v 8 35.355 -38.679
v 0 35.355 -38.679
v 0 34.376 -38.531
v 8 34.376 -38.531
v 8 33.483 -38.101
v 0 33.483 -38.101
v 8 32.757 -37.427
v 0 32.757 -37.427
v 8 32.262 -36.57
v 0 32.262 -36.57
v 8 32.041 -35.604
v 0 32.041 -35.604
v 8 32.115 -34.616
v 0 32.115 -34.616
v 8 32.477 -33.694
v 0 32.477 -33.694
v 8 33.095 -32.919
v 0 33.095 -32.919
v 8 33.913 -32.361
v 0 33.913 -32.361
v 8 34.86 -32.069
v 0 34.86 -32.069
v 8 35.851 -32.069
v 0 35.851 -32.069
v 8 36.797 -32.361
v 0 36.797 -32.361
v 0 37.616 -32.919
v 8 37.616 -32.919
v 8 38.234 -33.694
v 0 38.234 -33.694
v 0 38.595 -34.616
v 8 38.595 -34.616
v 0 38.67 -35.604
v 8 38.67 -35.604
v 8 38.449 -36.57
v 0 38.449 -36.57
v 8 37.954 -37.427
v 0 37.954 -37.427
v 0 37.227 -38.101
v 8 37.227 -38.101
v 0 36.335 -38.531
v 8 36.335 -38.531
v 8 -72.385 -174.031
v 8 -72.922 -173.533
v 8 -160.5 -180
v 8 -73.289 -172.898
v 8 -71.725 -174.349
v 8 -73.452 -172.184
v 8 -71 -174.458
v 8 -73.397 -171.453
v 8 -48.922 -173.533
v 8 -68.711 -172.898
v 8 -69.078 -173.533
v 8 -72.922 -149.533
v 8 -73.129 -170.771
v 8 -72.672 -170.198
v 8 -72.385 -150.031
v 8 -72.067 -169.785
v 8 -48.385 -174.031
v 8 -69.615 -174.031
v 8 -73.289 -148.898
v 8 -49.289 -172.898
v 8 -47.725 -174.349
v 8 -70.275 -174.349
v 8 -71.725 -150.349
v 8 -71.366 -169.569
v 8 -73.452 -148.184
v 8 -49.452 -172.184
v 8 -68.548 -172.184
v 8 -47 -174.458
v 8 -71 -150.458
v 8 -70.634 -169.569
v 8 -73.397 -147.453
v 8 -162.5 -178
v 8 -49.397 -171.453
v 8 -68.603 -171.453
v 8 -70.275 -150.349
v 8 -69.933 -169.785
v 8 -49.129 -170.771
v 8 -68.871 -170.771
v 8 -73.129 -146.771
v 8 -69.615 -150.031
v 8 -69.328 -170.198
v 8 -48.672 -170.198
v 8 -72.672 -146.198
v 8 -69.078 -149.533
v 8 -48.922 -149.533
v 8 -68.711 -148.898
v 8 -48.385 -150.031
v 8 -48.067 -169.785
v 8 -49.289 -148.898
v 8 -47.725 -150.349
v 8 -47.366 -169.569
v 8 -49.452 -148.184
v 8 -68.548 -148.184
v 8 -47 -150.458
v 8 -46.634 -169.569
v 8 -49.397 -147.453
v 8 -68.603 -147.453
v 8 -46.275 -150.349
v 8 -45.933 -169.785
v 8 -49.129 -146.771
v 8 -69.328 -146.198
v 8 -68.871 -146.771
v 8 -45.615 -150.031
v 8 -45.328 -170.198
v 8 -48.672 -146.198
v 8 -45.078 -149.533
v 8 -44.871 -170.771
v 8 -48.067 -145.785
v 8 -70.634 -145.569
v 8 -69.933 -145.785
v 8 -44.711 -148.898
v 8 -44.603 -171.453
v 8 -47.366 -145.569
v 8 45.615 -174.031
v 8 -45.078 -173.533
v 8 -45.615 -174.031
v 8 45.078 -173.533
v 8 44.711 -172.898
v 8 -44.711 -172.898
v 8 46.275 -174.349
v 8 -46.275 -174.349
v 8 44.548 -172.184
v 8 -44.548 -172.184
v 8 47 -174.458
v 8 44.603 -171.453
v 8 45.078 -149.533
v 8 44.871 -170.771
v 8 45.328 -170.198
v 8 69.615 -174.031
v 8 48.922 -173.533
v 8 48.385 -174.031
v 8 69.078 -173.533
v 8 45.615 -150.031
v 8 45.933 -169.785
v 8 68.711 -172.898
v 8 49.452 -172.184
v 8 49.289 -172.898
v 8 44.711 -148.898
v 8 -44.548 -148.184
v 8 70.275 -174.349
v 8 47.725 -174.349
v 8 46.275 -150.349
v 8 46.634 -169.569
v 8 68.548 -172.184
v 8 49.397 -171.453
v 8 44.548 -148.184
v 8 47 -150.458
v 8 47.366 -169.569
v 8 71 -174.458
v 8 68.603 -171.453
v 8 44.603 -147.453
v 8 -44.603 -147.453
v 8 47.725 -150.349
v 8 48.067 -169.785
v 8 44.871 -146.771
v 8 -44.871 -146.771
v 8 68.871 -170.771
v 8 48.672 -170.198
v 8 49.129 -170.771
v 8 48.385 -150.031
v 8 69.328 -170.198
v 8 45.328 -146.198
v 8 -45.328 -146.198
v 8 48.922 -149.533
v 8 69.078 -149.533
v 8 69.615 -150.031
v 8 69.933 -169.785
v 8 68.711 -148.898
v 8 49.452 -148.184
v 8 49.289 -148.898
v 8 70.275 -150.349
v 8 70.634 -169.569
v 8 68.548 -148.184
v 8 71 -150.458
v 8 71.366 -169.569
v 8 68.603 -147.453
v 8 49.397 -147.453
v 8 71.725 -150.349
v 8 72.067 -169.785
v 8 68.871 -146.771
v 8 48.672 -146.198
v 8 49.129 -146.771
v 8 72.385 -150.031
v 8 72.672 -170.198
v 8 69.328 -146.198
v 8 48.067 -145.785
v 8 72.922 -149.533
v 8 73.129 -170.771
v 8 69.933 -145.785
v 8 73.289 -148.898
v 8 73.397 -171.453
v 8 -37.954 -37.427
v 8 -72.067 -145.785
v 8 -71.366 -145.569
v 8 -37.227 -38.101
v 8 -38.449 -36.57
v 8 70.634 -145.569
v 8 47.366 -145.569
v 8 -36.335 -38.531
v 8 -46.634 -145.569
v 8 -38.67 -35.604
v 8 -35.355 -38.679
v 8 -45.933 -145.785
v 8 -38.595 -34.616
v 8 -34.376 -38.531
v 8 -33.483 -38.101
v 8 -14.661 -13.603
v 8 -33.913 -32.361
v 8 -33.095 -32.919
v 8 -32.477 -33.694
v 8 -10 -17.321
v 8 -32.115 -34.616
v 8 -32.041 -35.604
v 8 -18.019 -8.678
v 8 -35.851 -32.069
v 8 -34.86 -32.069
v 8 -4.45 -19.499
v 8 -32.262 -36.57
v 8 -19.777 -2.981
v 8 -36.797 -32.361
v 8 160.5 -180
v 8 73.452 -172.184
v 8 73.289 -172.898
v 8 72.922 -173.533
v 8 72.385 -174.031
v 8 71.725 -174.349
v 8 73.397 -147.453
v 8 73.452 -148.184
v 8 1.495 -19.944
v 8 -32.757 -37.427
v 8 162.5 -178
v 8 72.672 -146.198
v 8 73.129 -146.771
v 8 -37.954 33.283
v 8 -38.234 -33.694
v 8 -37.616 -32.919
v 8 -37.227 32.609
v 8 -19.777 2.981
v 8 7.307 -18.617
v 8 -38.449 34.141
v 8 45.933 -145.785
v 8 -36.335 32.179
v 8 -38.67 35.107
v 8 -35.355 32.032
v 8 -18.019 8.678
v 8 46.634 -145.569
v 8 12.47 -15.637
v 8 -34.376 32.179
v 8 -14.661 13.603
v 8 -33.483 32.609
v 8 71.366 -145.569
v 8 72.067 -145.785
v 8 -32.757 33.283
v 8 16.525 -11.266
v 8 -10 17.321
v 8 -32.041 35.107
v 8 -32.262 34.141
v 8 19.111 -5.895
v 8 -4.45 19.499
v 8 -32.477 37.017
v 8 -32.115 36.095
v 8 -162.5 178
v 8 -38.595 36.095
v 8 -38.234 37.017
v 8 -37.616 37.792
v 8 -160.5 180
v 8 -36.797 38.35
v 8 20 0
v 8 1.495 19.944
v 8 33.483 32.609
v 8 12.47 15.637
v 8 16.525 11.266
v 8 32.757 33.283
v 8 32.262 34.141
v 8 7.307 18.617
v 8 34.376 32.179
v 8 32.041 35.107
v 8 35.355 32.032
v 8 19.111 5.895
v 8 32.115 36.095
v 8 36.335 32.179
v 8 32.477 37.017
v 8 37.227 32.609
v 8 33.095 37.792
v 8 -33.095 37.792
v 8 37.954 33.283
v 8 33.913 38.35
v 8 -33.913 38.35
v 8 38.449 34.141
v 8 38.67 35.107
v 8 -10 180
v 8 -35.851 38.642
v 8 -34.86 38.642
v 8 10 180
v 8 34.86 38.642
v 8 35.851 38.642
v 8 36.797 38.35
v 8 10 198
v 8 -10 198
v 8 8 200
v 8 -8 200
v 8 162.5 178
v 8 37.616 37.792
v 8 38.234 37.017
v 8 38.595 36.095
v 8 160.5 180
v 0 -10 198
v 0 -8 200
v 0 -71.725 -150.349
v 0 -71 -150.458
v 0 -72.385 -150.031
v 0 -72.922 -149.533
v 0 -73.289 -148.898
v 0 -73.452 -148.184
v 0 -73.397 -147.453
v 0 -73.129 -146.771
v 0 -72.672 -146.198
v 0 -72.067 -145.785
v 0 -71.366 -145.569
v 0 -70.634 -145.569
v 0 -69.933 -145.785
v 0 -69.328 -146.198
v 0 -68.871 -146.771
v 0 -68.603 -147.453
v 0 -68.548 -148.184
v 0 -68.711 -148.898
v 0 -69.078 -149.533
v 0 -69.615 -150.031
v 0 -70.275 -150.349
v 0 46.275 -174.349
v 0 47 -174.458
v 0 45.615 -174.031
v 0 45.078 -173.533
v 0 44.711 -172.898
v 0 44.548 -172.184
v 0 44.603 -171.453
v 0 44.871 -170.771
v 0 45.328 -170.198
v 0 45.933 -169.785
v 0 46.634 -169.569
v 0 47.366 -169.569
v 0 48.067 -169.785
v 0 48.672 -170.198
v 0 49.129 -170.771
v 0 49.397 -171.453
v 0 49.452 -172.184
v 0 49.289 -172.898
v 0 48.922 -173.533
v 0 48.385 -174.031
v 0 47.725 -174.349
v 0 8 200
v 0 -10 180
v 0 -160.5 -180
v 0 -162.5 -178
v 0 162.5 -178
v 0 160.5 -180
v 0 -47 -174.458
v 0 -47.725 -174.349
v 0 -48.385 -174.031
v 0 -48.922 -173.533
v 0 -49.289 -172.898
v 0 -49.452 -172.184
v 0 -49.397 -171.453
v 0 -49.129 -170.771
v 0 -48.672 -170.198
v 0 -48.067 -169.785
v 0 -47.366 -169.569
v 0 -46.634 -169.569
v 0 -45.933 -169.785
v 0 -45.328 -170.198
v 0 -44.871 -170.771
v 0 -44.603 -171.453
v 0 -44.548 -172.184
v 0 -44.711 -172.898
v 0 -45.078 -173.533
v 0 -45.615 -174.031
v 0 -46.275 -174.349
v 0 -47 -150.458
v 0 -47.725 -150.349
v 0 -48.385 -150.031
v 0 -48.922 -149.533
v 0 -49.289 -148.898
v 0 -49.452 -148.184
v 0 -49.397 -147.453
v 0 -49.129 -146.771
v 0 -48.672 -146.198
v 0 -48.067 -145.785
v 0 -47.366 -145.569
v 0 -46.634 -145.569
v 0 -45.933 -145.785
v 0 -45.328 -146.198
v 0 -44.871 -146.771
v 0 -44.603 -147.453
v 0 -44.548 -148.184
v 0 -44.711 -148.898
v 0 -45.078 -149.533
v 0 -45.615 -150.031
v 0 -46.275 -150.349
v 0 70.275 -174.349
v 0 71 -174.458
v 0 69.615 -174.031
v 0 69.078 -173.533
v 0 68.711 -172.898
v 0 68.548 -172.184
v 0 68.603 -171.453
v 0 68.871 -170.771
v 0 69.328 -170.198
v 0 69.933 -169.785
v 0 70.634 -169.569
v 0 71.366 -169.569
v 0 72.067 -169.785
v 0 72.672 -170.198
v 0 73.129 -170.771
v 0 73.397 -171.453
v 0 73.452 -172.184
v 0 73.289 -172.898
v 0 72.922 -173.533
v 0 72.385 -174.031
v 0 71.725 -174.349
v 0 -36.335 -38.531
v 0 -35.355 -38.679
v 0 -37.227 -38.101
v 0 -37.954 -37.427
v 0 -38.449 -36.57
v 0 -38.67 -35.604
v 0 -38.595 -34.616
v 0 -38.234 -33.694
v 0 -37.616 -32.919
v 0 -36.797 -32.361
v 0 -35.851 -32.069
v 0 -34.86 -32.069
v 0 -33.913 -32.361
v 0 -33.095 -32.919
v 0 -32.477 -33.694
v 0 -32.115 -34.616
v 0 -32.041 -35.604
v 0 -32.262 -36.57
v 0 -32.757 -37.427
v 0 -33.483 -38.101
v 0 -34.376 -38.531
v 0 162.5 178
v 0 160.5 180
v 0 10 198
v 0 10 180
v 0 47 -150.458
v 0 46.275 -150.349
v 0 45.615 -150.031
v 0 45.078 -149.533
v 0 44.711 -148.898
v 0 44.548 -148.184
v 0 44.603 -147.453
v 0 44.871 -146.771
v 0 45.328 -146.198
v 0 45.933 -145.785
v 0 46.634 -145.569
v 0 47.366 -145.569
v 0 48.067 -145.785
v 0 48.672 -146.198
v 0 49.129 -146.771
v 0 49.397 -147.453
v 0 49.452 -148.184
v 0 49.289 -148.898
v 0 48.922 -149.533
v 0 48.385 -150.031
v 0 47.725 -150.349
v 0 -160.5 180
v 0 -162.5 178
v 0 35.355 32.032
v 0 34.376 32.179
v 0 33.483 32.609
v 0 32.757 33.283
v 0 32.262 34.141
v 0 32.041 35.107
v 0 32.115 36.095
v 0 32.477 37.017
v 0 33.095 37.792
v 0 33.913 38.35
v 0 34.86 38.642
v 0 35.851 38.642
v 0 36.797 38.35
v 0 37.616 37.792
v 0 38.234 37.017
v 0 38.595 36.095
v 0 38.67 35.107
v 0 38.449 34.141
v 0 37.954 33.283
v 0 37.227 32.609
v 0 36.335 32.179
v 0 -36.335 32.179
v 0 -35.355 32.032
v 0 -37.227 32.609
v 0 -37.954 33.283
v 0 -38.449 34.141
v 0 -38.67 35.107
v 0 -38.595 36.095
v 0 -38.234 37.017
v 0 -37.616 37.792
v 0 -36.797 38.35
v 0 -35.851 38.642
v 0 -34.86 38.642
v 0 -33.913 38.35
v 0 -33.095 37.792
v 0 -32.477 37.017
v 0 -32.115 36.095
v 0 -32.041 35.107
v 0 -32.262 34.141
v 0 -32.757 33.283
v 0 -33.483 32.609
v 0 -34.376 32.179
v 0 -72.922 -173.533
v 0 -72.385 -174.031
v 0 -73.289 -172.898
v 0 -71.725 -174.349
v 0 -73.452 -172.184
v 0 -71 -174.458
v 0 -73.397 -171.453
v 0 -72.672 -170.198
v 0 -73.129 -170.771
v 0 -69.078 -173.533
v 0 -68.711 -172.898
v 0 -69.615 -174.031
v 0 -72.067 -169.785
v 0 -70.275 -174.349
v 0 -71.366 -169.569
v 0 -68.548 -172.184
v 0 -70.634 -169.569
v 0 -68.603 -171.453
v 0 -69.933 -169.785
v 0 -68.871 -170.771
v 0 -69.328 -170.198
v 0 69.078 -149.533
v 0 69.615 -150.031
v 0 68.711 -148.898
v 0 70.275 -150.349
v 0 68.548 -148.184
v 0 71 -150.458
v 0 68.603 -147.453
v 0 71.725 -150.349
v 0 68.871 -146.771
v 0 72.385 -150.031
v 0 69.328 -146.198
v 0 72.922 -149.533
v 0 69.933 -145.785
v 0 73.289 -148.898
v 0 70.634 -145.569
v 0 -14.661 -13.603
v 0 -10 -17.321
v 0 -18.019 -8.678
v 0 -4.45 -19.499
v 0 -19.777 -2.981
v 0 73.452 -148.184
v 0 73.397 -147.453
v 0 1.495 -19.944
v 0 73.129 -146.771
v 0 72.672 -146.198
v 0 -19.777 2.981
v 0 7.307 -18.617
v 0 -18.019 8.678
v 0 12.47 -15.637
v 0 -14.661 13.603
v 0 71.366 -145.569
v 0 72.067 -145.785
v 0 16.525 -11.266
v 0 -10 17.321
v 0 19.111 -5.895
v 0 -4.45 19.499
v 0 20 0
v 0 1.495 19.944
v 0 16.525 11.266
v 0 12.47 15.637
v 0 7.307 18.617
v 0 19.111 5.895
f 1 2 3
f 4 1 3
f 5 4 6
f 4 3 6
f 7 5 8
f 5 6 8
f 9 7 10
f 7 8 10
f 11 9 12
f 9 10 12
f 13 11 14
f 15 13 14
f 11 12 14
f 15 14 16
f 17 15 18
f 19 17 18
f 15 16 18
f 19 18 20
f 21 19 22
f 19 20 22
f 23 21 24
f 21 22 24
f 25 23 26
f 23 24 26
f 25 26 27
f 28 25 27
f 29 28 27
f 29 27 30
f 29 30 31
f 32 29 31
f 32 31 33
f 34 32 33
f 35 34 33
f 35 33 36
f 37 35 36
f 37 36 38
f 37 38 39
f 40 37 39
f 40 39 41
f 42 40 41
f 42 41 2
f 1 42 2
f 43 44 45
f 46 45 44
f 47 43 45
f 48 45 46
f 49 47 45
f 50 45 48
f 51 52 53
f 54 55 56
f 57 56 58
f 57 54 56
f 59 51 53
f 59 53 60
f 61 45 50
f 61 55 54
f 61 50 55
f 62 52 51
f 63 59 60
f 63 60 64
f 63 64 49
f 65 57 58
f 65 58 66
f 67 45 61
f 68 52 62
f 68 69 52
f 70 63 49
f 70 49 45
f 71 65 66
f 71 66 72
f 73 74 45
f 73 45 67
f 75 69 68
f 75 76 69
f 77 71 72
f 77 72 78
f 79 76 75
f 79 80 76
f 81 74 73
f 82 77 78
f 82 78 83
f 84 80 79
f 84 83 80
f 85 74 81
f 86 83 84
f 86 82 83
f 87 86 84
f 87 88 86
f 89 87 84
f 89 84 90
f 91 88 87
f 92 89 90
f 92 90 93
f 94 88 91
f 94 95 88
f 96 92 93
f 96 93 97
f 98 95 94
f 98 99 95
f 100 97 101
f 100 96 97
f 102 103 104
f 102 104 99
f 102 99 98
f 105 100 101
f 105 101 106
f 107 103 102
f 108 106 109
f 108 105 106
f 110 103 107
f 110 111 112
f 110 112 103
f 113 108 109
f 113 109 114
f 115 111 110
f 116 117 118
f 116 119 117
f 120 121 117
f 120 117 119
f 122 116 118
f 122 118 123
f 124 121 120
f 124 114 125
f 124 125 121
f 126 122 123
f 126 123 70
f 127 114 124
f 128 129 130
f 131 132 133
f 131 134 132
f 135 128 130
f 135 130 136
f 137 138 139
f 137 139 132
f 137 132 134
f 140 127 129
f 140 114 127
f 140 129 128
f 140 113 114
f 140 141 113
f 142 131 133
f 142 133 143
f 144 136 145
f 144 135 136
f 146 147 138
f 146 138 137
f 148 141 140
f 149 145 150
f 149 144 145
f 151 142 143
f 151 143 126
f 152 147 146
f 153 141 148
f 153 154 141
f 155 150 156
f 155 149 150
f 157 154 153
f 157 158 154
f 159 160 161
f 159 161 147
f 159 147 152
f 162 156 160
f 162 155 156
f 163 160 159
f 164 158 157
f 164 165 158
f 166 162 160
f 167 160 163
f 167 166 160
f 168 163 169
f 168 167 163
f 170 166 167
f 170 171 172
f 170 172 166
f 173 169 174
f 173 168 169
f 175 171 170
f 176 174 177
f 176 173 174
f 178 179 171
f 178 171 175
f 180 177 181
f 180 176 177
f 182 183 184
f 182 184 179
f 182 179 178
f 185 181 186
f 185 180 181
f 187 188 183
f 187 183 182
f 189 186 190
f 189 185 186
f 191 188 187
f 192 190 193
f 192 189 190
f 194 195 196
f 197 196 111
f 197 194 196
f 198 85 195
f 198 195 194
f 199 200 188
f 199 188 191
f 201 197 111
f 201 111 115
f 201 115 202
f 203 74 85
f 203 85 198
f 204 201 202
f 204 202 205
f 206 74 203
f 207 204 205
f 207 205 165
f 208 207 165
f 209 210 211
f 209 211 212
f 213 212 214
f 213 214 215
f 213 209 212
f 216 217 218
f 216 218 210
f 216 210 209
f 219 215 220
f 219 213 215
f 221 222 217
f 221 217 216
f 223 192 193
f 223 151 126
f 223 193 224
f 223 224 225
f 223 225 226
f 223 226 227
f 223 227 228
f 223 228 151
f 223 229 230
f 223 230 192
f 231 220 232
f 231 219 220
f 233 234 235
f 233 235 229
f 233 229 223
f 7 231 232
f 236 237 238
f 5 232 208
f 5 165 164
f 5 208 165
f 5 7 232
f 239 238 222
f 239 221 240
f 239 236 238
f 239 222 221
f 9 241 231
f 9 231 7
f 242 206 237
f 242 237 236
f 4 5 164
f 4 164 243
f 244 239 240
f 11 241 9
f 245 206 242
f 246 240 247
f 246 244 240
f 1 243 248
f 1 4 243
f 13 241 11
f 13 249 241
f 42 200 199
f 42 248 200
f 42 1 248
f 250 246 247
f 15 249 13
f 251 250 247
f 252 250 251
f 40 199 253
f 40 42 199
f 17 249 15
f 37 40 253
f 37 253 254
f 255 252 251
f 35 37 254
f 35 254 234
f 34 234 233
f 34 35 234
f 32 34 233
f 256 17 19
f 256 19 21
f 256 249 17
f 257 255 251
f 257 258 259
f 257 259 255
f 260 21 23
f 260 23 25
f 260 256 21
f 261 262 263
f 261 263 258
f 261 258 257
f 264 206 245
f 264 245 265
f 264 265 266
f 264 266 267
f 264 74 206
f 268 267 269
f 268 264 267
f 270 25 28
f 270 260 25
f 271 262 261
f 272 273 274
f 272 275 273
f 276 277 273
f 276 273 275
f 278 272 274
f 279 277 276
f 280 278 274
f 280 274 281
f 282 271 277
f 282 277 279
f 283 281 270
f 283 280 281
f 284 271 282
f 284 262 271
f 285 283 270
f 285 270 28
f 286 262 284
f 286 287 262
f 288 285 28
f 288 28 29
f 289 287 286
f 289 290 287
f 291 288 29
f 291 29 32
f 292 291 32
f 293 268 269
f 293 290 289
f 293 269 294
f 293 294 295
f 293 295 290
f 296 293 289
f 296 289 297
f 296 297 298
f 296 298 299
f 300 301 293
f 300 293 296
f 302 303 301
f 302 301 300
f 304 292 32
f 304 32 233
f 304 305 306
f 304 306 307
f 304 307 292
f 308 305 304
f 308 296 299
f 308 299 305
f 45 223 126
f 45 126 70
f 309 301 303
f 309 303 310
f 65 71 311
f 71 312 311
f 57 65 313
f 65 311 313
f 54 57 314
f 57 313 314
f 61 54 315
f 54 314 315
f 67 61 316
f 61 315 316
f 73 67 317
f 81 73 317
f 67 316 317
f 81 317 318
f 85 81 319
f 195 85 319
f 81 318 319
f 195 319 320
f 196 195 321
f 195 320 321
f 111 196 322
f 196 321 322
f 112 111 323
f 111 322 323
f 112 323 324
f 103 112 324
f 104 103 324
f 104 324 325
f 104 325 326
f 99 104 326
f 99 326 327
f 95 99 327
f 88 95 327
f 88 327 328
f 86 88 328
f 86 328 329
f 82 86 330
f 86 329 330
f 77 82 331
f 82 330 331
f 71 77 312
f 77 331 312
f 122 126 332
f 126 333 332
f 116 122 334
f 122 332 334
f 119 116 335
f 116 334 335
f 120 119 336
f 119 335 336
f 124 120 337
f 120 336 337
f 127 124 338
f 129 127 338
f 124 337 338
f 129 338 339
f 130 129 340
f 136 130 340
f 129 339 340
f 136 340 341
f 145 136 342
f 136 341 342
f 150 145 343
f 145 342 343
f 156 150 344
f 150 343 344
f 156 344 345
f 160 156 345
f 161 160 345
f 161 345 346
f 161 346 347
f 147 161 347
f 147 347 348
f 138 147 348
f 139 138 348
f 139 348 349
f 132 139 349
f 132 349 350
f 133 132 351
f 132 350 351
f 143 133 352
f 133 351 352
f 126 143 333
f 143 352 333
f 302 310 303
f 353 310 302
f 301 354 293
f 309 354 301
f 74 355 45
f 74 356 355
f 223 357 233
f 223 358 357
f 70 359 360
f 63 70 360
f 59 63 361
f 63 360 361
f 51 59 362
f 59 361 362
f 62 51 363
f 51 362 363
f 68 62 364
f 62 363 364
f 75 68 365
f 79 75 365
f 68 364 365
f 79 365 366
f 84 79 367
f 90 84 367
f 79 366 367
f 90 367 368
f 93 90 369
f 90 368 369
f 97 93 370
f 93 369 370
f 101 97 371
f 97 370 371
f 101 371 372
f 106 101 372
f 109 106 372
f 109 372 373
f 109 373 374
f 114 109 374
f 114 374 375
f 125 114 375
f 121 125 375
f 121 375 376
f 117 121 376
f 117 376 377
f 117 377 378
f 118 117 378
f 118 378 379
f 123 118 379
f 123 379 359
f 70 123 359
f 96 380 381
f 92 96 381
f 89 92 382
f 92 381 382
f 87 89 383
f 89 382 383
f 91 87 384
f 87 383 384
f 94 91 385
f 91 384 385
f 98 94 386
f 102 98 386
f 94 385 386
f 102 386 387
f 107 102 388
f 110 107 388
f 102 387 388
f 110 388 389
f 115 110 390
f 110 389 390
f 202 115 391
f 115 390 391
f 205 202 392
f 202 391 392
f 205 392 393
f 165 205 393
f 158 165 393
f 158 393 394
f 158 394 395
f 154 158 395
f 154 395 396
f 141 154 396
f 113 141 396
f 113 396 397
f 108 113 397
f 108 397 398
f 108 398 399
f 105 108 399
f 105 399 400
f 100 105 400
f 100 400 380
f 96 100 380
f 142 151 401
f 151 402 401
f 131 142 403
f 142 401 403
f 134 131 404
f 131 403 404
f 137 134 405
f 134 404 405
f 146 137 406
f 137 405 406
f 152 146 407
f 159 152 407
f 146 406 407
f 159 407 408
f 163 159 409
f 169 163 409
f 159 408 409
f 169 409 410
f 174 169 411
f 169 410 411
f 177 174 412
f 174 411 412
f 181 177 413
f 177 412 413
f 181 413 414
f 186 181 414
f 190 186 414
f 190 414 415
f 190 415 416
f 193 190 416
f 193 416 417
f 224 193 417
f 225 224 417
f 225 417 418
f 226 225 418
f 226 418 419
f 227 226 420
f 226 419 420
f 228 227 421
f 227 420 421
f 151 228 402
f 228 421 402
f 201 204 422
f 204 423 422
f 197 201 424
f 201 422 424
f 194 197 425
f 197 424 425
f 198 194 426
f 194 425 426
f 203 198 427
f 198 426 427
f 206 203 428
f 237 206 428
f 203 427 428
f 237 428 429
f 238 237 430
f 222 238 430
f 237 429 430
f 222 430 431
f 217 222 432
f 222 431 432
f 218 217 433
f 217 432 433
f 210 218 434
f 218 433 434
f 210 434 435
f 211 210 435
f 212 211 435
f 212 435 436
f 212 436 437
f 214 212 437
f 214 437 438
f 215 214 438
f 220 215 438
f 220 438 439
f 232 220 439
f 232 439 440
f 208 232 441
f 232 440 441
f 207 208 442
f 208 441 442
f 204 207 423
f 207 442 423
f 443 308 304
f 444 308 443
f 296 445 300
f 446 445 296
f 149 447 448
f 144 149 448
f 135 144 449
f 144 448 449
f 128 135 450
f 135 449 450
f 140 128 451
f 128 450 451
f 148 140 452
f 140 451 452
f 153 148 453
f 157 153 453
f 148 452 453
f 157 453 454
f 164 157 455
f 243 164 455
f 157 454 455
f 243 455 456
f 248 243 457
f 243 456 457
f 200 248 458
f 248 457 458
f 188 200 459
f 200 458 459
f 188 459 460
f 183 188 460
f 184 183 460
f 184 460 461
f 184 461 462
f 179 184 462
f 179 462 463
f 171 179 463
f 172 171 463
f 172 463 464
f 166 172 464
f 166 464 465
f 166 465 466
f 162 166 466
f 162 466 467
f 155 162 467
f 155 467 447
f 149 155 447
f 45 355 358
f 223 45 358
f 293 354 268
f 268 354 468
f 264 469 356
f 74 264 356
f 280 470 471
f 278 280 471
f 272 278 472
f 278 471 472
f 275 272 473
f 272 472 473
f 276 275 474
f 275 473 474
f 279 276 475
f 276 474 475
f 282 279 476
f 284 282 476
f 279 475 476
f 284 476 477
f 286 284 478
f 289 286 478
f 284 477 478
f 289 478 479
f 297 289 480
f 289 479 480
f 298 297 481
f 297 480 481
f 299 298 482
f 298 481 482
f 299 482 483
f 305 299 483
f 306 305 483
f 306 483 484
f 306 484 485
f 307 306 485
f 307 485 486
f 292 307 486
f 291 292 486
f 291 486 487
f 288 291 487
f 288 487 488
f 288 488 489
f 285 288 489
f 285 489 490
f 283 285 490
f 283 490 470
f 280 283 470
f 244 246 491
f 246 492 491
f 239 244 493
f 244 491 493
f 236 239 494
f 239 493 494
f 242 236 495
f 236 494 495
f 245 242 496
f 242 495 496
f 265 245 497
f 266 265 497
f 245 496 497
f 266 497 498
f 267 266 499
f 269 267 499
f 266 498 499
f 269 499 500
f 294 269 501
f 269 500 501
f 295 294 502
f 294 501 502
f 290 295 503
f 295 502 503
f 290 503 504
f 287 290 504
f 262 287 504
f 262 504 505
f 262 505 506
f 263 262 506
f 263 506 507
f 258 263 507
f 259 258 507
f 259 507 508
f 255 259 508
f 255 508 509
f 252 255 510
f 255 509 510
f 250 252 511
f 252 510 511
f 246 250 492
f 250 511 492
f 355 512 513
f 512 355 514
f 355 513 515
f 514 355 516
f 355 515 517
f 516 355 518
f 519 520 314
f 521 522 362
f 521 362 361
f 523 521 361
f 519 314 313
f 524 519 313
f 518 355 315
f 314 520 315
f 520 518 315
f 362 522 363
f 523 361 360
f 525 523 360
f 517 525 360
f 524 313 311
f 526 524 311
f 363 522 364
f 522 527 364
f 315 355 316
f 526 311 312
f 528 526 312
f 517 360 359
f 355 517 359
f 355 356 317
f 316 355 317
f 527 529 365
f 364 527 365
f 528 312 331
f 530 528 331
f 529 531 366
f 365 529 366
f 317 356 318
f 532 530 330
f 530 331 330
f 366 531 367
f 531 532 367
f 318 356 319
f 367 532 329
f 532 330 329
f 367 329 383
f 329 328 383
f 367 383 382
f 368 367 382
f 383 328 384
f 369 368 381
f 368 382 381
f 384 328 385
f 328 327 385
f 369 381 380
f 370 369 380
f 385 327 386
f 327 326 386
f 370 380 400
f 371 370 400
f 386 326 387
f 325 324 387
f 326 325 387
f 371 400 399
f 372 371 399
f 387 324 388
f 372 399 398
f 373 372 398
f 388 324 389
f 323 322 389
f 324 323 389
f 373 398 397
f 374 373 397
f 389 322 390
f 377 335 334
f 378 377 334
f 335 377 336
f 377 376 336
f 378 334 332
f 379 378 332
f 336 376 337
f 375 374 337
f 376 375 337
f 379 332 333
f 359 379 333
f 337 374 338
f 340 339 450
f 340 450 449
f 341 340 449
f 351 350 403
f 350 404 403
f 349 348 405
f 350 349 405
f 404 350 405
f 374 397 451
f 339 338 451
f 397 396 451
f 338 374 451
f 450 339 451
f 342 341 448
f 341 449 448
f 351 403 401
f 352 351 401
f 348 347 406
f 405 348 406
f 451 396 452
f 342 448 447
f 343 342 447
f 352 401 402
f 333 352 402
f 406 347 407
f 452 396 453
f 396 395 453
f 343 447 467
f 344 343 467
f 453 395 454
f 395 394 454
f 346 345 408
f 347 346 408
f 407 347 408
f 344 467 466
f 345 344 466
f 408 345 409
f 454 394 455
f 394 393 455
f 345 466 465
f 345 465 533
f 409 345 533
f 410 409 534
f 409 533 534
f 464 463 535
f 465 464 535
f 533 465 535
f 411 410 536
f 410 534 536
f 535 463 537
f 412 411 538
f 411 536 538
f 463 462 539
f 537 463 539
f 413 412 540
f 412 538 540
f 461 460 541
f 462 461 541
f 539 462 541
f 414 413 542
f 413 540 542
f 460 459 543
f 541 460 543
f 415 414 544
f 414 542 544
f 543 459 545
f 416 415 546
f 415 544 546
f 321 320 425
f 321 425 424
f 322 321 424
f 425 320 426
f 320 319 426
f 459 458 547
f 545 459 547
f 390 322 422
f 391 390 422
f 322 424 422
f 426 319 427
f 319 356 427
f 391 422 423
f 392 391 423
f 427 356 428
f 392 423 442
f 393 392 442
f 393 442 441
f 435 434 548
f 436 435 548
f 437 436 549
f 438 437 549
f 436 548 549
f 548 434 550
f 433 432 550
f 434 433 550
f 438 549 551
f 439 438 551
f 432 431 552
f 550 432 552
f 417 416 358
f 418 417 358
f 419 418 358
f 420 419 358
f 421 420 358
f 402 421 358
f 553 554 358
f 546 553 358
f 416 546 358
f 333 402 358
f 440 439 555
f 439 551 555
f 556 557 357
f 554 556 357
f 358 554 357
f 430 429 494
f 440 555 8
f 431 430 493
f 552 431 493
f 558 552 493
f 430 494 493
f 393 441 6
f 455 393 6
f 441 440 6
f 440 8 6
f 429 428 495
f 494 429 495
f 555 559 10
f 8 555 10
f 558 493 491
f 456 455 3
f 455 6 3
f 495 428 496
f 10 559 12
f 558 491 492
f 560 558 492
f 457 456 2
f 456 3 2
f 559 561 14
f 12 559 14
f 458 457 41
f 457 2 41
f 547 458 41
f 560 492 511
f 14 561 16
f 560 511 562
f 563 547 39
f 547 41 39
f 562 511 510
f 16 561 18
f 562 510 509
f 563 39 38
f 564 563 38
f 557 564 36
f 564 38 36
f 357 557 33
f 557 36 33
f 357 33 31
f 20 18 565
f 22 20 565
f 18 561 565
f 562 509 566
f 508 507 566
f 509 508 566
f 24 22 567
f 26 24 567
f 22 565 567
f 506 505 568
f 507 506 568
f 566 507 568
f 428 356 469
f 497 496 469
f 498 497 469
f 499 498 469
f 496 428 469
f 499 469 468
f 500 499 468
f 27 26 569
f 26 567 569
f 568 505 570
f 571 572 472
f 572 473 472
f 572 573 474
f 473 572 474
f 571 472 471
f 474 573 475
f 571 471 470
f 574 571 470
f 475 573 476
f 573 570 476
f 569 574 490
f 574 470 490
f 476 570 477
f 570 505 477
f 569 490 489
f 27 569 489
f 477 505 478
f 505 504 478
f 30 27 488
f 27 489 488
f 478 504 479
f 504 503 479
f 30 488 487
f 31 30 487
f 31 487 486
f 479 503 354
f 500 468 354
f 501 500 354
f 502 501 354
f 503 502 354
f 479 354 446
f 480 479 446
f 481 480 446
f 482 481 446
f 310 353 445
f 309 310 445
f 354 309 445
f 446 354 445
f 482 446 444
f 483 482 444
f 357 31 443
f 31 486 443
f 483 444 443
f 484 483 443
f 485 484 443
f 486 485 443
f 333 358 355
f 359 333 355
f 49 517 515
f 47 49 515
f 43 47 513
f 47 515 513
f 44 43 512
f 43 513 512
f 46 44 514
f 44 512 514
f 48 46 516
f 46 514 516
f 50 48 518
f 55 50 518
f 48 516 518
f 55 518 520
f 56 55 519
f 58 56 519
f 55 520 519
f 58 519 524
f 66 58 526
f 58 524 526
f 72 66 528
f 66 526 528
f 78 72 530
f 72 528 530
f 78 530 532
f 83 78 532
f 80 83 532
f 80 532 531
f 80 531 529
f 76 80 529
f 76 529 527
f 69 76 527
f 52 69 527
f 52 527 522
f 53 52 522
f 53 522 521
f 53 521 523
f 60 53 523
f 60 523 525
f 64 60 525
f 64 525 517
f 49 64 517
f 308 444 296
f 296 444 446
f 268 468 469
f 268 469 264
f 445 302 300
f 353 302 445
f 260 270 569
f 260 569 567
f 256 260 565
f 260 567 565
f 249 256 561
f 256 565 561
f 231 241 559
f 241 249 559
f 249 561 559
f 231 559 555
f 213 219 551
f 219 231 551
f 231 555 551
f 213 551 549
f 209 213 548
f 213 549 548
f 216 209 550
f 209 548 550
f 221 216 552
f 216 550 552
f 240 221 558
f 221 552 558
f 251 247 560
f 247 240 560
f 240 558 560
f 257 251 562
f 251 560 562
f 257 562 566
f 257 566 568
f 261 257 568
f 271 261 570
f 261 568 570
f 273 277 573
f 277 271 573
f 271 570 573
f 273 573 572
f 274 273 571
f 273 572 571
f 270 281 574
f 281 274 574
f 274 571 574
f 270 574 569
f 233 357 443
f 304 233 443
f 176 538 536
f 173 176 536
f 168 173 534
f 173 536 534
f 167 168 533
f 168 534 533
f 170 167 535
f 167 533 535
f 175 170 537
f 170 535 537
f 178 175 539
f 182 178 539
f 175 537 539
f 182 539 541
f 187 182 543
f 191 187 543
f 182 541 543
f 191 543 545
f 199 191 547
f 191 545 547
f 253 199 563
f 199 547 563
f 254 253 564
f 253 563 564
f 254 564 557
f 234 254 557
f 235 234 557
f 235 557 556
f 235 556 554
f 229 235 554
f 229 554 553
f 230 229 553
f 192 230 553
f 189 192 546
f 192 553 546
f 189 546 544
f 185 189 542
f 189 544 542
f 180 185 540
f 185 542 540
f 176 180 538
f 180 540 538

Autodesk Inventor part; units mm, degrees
ref_plane "YZ Plane" through (0, 0, 0) normal (1, 0, 0) x (0, 1, 0)
ref_plane "XZ Plane" through (0, 0, 0) normal (0, 1, 0) x (-1, 0, 0)
ref_plane "XY Plane" through (0, 0, 0) normal (0, 0, 1) x (1, 0, 0)
sketch "草图1" plane through (0, 0, 0) normal (1, 0, 0) x (0, 1, 0)
  line L0 (162.5, 180) -> (-162.5, 180)
  line L1 (-162.5, 180) -> (-162.5, -180)
  line L2 (-162.5, -180) -> (162.5, -180)
  line L3 (162.5, -180) -> (162.5, 180)
  line L4 (162.5, 180) -> (-162.5, -180) construction
  line L5 (-162.5, 180) -> (162.5, -180) construction
  circle A0 centre (0, 0) radius 20
  line L6 (-10, 200) -> (10, 200)
  line L7 (10, 200) -> (10, 180)
  line L8 (10, 180) -> (-10, 180)
  line L9 (-10, 180) -> (-10, 200)
  line L10 (-10, 200) -> (10, 180) construction
  line L11 (10, 200) -> (-10, 180) construction
  point P0 (0, 190)
  point P1 (0, 190)
  dimension "d0" = 325
  dimension "d1" = 360
  dimension "d2" = 40
  dimension "d54" = 20
  dimension "d55" = 20
extrude "拉伸1" add sketch "草图1" along normal blind 8
chamfer "倒角1" distance 2 angle 45 4 edges at (4, 162.5, 180) (4, 162.5, -180) (4, -162.5, 180) (4, -162.5, -180)
sketch "草图2" plane through (8, 0, 0) normal (1, 0, 0) x (0, 0, -1)
  line L0 (178, 162.5) -> (-178, 162.5) projected
  line L1 (-180, 160.5) -> (-180, -160.5) projected
  line L2 (180, -160.5) -> (180, 160.5) projected
  line L3 (-178, -162.5) -> (178, -162.5) projected
  point P0 (0, 0)
  point P1 (148, 71)
  point P2 (148, 47)
  point P3 (172, 71)
  point P4 (172, 47)
  point P5 (172, -71)
  point P6 (172, -47)
  point P7 (148, -71)
  point P8 (148, -47)
  dimension "d8" = 91.5
  dimension "d12" = 24
  dimension "d15" = 24
  dimension "d20" = 118
  dimension "d25" = 94
  dimension "d26" = 142
  dimension "d27" = 352
  dimension "d50" = 8
  dimension "d51" = 91.5
hole "孔1" at (8, 71, -148) at (8, 47, -148) at (8, 71, -172) at (8, 47, -172) at (8, -71, -172) at (8, -47, -172) at (8, -71, -148) at (8, -47, -148) direction (-1, 0, 0) diameter 4.917 end through all thread size "M6x1" designation "M6" class "6H" standard "GB Metric profile"
sketch "草图3" plane through (8, 0, 0) normal (1, 0, 0) x (0, 0, -1)
  line L0 (0, 0) -> (-35.3553, 35.3553) construction
  line L1 (-178, -162.5) -> (178, -162.5) projected
  line L2 (0, 0) -> (-35.3553, -35.3553) construction
  line L3 (0, 0) -> (35.3553, -35.3553) construction
  line L4 (0, 0) -> (35.3553, 35.3553) construction
  dimension "d35" = 45
  dimension "d36" = 50
  dimension "d39" = 360
hole "孔2" at (8, 35.3553, 35.3553) at (8, -35.3553, 35.3553) at (8, -35.3553, -35.3553) at (8, 35.3553, -35.3553) direction (-1, 0, 0) diameter 6.647 end through all thread size "M8x1.25" designation "M8" class "6H" standard "GB Metric profile"
chamfer "倒角2" distance 2 angle 45 2 edges at (4, 10, 200) (4, -10, 200)
properties part number "CTQCX300.2-1门板" material "钢板B-8/SUS304"
